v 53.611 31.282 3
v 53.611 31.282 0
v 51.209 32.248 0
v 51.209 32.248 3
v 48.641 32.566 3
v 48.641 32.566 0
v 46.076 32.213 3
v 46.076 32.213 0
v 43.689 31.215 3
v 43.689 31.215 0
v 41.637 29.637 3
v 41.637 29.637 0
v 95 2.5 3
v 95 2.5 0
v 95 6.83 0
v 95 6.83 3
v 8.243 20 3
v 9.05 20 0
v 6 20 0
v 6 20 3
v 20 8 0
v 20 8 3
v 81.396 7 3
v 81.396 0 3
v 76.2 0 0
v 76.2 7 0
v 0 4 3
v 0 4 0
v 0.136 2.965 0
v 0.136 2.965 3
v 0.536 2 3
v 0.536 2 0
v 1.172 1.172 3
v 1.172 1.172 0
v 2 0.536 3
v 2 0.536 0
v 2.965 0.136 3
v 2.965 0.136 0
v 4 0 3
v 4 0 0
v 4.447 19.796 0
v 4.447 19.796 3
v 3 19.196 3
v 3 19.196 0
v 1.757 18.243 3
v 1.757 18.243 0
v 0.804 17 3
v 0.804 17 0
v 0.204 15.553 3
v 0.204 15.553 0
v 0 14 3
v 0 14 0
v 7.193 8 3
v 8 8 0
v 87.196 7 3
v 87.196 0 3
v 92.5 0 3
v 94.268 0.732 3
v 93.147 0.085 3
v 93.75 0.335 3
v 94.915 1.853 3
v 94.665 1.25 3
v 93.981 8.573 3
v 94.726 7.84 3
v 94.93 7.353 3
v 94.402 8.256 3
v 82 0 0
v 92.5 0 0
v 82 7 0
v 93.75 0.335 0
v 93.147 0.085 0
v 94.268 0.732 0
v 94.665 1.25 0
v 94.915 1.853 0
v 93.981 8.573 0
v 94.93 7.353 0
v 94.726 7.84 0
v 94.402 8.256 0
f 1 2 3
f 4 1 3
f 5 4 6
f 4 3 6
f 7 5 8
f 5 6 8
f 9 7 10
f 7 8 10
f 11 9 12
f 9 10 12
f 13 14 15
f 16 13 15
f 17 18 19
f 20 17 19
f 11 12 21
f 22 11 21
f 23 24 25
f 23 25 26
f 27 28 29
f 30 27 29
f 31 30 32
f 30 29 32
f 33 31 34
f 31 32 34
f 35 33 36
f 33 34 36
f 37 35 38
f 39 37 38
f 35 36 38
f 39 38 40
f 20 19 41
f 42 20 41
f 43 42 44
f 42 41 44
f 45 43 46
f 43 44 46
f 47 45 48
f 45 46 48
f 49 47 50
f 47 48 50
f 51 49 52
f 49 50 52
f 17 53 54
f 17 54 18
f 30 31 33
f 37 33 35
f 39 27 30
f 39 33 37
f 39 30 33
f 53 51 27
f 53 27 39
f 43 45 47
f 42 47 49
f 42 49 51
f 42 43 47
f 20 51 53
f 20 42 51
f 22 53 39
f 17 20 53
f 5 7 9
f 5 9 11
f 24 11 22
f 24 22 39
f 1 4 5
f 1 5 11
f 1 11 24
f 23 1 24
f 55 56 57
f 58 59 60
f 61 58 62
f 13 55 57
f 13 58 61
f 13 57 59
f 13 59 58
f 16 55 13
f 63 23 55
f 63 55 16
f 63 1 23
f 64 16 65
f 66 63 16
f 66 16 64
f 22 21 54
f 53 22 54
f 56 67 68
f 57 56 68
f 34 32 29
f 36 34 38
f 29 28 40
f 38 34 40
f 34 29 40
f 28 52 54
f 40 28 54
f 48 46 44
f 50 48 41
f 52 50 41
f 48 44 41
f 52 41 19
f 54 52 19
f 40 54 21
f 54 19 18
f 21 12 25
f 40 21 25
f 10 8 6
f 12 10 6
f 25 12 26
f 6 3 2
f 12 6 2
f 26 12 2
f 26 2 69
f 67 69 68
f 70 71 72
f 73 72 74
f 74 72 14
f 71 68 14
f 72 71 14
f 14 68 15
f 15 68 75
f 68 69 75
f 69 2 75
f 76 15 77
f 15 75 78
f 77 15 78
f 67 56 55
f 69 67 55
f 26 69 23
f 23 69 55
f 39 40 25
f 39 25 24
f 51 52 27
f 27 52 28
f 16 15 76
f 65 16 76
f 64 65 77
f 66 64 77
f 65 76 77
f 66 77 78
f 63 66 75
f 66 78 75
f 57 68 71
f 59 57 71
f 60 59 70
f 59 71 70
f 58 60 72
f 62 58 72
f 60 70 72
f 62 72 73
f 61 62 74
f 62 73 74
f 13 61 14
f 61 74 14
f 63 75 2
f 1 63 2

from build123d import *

# Parameters (mm, degrees)
F1_DEPTH = 3
F5_SIZE2 = 0.803838
F5_SIZE  = 2.99999
F4_W     = 7
F4_H     = 2.9
F6_DEPTH = 12.5


# Not quite as in the source:
# - a fillet or chamfer is up to 0.001 mm smaller than in the source, because OpenCascade refuses the exact size


with BuildPart() as f1:
    # F0 (on Top) → F1 (new body)
    with BuildSketch(Plane.XY):
        with BuildLine():
            Line((4, 0), (92.5, 0))
            ThreePointArc((92.5, 0), (94.267766953, 0.732233047), (95, 2.5))
            Line((95, 2.5), (95, 6.8303050312))
            ThreePointArc((95, 6.8303050312), (94.7264189756, 7.8399968261), (93.9805224793, 8.5734561054))
            Line((93.9805224793, 8.5734561054), (53.6105552952, 31.2815626464))
            ThreePointArc((53.6105552952, 31.2815626464), (47.3471346779, 32.4727846642), (41.636875087, 29.636875087))
            Line((41.636875087, 29.636875087), (20, 8))
            Line((20, 8), (8, 8))
            Line((8, 8), (9.0498639623, 20))
            Line((9.0498639623, 20), (6, 20))
            ThreePointArc((6, 20), (1.7573593129, 18.2426406871), (0, 14))
            Line((0, 14), (0, 4))
            ThreePointArc((0, 4), (1.1715728753, 1.1715728753), (4, 0))
        make_face()
    extrude(amount=F1_DEPTH)

    # F5 (size 3 and 0.8038475773 in the source; OpenCascade refuses exactly that, so slightly less here)
    f5_edges = [f1.edges().sort_by_distance(p)[0] for p in [
        (8.524932, 14, 3),
    ]]
    f5_side = f1.faces().sort_by_distance((8.524932, 14, 1.5))[0]
    chamfer(f5_edges, length=F5_SIZE, length2=F5_SIZE2, reference=f5_side)

    # F4 (on line) → F6 (cut, symmetric)
    with BuildSketch(Plane(origin=(61.5, 0, 35.5070415552), x_dir=(0, 1, 0), z_dir=(0.8660254038, 0, 0.5))):
        with Locations((3.5, -39.55)):
            Rectangle(F4_W, F4_H)
    extrude(amount=F6_DEPTH, both=True, mode=Mode.SUBTRACT)


solid = f1.part
